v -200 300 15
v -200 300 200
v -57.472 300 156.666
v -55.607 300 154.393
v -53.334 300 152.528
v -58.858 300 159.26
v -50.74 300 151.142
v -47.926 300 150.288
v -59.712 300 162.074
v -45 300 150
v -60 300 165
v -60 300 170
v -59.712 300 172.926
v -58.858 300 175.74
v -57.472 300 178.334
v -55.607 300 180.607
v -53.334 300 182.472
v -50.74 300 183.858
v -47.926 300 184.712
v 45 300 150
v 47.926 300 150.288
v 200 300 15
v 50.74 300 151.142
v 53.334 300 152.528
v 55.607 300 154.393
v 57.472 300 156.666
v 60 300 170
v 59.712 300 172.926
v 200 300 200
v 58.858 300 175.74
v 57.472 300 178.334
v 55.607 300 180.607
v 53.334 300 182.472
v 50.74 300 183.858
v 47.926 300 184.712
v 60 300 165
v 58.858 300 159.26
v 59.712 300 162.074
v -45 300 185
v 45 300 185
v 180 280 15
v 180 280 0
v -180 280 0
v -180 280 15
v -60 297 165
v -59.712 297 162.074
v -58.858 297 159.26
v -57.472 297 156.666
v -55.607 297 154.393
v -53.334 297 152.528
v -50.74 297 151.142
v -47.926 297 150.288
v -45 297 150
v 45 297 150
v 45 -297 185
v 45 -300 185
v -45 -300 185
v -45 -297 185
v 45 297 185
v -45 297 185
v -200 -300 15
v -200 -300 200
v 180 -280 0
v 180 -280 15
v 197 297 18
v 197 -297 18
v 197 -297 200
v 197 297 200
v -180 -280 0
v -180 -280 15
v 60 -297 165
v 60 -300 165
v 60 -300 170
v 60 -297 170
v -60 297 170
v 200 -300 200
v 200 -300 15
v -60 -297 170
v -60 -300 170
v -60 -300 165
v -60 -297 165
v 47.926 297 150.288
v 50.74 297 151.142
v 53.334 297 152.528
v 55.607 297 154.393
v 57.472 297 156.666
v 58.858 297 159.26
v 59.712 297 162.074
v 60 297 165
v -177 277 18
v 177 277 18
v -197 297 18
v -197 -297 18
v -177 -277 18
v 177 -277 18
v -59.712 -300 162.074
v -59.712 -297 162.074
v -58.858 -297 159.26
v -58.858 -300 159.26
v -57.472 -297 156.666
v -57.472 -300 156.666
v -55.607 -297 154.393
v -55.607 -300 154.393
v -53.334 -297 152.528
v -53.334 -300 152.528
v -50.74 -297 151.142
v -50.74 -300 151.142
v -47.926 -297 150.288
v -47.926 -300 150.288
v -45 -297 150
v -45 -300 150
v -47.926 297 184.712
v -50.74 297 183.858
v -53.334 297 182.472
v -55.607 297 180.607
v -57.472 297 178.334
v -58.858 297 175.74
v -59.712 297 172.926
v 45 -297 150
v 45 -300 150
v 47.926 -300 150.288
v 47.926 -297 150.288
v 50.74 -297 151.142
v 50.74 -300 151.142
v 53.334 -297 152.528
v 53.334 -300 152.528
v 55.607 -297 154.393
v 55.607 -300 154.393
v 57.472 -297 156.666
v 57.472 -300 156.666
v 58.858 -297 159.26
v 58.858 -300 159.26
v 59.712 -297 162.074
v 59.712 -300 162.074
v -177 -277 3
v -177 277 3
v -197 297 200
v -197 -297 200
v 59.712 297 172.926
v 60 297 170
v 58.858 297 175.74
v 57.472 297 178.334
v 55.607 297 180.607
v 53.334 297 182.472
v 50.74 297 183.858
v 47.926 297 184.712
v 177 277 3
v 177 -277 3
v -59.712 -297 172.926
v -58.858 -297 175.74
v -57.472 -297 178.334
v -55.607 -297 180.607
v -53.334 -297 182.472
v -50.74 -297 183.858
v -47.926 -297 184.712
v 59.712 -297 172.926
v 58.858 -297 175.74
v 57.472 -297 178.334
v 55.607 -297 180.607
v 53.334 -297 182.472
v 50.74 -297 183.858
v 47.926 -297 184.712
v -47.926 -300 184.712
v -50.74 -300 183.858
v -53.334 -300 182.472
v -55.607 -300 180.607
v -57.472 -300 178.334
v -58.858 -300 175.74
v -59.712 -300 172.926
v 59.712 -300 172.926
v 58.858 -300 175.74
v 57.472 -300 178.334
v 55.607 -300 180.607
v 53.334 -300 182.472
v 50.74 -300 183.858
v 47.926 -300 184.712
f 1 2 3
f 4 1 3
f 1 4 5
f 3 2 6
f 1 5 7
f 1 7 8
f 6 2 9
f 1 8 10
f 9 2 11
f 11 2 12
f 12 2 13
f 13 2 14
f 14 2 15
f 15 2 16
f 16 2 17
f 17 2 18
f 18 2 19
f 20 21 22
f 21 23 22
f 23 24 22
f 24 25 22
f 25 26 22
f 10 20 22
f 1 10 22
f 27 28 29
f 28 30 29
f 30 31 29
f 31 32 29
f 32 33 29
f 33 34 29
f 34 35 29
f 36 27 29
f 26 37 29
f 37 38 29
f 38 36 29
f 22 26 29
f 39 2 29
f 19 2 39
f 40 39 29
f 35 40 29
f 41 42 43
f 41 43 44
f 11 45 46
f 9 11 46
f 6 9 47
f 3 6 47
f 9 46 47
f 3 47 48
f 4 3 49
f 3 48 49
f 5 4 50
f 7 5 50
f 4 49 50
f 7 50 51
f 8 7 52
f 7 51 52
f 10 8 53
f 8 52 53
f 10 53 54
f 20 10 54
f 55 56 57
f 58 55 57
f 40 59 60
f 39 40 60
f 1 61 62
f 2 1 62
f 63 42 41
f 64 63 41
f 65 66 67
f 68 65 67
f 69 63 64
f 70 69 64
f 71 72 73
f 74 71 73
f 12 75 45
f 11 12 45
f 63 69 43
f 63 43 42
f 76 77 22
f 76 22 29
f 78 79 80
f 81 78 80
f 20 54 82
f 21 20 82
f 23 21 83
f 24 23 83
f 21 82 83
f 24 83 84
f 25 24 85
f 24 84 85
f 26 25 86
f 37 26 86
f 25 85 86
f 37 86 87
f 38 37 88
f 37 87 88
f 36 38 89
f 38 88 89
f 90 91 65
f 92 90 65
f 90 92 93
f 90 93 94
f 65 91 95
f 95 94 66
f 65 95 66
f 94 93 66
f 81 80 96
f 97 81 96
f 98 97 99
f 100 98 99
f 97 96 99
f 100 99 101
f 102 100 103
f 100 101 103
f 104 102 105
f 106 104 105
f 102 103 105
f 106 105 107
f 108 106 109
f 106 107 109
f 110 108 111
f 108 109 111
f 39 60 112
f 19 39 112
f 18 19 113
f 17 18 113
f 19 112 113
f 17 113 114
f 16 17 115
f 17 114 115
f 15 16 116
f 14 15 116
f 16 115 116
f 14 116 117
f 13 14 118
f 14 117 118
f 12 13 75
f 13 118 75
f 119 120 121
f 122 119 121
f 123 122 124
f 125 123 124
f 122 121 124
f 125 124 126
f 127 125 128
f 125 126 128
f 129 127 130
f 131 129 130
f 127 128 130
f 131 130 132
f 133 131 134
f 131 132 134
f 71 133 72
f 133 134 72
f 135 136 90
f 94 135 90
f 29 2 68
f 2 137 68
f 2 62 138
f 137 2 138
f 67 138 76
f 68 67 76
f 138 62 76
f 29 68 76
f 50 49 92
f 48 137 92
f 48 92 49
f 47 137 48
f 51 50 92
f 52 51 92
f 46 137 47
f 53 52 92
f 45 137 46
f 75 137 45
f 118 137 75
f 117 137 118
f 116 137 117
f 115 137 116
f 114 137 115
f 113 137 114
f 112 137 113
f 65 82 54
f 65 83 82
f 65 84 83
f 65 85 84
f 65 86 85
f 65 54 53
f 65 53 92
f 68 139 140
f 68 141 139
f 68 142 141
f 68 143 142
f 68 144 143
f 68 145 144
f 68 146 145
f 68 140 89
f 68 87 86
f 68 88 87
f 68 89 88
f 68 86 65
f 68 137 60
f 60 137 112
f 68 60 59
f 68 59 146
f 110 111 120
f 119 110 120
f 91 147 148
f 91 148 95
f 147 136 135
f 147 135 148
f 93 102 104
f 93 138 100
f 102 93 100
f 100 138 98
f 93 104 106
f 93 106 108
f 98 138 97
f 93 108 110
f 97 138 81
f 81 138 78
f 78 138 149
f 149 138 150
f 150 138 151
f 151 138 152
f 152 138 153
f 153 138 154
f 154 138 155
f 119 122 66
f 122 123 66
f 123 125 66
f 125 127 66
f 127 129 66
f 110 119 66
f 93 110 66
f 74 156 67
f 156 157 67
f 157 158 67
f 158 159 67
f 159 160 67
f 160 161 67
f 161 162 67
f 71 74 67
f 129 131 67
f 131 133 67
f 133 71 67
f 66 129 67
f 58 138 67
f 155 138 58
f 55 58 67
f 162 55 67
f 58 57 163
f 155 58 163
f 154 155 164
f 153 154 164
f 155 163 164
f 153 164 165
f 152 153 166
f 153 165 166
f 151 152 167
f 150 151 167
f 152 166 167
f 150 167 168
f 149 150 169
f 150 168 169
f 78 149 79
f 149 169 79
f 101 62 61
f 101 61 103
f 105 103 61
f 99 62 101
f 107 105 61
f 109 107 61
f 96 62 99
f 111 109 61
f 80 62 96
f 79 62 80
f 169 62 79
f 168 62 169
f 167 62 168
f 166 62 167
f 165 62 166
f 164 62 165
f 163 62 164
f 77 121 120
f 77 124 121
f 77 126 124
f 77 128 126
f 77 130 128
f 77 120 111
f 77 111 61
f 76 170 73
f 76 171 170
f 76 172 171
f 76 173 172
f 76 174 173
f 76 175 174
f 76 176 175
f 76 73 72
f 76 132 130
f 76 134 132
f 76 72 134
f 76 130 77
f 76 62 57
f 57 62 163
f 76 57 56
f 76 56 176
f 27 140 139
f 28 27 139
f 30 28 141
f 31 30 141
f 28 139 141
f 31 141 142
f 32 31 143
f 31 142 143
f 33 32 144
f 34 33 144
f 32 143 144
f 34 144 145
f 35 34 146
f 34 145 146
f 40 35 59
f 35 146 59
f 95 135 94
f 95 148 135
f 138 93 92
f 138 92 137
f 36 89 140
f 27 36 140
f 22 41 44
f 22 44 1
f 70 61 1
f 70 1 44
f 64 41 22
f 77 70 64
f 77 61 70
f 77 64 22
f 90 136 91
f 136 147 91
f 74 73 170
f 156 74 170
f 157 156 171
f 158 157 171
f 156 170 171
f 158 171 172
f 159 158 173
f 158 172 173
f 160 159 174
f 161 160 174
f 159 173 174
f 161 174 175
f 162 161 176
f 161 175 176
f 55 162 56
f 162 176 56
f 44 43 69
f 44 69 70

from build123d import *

# Parameters (mm, degrees)
F0_W     = 400
F0_H     = 200
F1_DEPTH = 300
F2_W     = 34.6541681295
F2_H     = 41.7717497936
F3_DEPTH = 600.001
F4_W     = 32.9372721782
F4_H     = 23.155899561
F5_DEPTH = 400.001
F6_T     = -3
F8_DEPTH = 600.001


# Not quite as in the source:
# - a pattern or mirror of a feature is missing from the dataset's text; its kind, count and spacing are read off the source's solid


with BuildPart() as f1:
    # F0 (on Front) → F1 (new body, symmetric)
    with BuildSketch(Plane.XZ):
        with Locations((0, 100)):
            Rectangle(F0_W, F0_H)
    extrude(amount=F1_DEPTH, both=True)

    # F2 (on face) → F3 (cut, through all)
    with BuildSketch(Plane.XZ.offset(300)):
        with Locations((-197.3270840647, -5.8858748968)):
            Rectangle(F2_W, F2_H)
    f3 = extrude(amount=-F3_DEPTH, mode=Mode.SUBTRACT)

    # F3_copies: F3 across plane
    add(f3.mirror(Plane(origin=(0, 0, 0), x_dir=(0, 0, 1), z_dir=(1, 0, 0))), mode=Mode.SUBTRACT)

    # F4 (on face) → F5 (cut, through all)
    with BuildSketch(Plane.YZ.offset(200)):
        with Locations((-296.4686360891, 3.4220502195)):
            Rectangle(F4_W, F4_H)
        with Locations((296.4686360891, 3.4220502195)):
            Rectangle(F4_W, F4_H)
    extrude(amount=-F5_DEPTH, mode=Mode.SUBTRACT)

    # F6
    f6_openings = [f1.faces().sort_by_distance(p)[0] for p in [
        (0, 0, 200),
    ]]
    offset(amount=F6_T, openings=f6_openings, kind=Kind.INTERSECTION)

    # F7 (on face) → F8 (cut, through all)
    with BuildSketch(Plane.XZ.offset(300)):
        with BuildLine():
            Line((45, 185), (-45, 185))
            ThreePointArc((-45, 185), (-55.6066017178, 180.6066017178), (-60, 170))
            Line((-60, 170), (-60, 165))
            ThreePointArc((-60, 165), (-55.6066017178, 154.3933982822), (-45, 150))
            Line((-45, 150), (45, 150))
            ThreePointArc((45, 150), (55.6066017178, 154.3933982822), (60, 165))
            Line((60, 165), (60, 170))
            ThreePointArc((60, 170), (55.6066017178, 180.6066017178), (45, 185))
        make_face()
    extrude(amount=-F8_DEPTH, mode=Mode.SUBTRACT)


solid = f1.part
